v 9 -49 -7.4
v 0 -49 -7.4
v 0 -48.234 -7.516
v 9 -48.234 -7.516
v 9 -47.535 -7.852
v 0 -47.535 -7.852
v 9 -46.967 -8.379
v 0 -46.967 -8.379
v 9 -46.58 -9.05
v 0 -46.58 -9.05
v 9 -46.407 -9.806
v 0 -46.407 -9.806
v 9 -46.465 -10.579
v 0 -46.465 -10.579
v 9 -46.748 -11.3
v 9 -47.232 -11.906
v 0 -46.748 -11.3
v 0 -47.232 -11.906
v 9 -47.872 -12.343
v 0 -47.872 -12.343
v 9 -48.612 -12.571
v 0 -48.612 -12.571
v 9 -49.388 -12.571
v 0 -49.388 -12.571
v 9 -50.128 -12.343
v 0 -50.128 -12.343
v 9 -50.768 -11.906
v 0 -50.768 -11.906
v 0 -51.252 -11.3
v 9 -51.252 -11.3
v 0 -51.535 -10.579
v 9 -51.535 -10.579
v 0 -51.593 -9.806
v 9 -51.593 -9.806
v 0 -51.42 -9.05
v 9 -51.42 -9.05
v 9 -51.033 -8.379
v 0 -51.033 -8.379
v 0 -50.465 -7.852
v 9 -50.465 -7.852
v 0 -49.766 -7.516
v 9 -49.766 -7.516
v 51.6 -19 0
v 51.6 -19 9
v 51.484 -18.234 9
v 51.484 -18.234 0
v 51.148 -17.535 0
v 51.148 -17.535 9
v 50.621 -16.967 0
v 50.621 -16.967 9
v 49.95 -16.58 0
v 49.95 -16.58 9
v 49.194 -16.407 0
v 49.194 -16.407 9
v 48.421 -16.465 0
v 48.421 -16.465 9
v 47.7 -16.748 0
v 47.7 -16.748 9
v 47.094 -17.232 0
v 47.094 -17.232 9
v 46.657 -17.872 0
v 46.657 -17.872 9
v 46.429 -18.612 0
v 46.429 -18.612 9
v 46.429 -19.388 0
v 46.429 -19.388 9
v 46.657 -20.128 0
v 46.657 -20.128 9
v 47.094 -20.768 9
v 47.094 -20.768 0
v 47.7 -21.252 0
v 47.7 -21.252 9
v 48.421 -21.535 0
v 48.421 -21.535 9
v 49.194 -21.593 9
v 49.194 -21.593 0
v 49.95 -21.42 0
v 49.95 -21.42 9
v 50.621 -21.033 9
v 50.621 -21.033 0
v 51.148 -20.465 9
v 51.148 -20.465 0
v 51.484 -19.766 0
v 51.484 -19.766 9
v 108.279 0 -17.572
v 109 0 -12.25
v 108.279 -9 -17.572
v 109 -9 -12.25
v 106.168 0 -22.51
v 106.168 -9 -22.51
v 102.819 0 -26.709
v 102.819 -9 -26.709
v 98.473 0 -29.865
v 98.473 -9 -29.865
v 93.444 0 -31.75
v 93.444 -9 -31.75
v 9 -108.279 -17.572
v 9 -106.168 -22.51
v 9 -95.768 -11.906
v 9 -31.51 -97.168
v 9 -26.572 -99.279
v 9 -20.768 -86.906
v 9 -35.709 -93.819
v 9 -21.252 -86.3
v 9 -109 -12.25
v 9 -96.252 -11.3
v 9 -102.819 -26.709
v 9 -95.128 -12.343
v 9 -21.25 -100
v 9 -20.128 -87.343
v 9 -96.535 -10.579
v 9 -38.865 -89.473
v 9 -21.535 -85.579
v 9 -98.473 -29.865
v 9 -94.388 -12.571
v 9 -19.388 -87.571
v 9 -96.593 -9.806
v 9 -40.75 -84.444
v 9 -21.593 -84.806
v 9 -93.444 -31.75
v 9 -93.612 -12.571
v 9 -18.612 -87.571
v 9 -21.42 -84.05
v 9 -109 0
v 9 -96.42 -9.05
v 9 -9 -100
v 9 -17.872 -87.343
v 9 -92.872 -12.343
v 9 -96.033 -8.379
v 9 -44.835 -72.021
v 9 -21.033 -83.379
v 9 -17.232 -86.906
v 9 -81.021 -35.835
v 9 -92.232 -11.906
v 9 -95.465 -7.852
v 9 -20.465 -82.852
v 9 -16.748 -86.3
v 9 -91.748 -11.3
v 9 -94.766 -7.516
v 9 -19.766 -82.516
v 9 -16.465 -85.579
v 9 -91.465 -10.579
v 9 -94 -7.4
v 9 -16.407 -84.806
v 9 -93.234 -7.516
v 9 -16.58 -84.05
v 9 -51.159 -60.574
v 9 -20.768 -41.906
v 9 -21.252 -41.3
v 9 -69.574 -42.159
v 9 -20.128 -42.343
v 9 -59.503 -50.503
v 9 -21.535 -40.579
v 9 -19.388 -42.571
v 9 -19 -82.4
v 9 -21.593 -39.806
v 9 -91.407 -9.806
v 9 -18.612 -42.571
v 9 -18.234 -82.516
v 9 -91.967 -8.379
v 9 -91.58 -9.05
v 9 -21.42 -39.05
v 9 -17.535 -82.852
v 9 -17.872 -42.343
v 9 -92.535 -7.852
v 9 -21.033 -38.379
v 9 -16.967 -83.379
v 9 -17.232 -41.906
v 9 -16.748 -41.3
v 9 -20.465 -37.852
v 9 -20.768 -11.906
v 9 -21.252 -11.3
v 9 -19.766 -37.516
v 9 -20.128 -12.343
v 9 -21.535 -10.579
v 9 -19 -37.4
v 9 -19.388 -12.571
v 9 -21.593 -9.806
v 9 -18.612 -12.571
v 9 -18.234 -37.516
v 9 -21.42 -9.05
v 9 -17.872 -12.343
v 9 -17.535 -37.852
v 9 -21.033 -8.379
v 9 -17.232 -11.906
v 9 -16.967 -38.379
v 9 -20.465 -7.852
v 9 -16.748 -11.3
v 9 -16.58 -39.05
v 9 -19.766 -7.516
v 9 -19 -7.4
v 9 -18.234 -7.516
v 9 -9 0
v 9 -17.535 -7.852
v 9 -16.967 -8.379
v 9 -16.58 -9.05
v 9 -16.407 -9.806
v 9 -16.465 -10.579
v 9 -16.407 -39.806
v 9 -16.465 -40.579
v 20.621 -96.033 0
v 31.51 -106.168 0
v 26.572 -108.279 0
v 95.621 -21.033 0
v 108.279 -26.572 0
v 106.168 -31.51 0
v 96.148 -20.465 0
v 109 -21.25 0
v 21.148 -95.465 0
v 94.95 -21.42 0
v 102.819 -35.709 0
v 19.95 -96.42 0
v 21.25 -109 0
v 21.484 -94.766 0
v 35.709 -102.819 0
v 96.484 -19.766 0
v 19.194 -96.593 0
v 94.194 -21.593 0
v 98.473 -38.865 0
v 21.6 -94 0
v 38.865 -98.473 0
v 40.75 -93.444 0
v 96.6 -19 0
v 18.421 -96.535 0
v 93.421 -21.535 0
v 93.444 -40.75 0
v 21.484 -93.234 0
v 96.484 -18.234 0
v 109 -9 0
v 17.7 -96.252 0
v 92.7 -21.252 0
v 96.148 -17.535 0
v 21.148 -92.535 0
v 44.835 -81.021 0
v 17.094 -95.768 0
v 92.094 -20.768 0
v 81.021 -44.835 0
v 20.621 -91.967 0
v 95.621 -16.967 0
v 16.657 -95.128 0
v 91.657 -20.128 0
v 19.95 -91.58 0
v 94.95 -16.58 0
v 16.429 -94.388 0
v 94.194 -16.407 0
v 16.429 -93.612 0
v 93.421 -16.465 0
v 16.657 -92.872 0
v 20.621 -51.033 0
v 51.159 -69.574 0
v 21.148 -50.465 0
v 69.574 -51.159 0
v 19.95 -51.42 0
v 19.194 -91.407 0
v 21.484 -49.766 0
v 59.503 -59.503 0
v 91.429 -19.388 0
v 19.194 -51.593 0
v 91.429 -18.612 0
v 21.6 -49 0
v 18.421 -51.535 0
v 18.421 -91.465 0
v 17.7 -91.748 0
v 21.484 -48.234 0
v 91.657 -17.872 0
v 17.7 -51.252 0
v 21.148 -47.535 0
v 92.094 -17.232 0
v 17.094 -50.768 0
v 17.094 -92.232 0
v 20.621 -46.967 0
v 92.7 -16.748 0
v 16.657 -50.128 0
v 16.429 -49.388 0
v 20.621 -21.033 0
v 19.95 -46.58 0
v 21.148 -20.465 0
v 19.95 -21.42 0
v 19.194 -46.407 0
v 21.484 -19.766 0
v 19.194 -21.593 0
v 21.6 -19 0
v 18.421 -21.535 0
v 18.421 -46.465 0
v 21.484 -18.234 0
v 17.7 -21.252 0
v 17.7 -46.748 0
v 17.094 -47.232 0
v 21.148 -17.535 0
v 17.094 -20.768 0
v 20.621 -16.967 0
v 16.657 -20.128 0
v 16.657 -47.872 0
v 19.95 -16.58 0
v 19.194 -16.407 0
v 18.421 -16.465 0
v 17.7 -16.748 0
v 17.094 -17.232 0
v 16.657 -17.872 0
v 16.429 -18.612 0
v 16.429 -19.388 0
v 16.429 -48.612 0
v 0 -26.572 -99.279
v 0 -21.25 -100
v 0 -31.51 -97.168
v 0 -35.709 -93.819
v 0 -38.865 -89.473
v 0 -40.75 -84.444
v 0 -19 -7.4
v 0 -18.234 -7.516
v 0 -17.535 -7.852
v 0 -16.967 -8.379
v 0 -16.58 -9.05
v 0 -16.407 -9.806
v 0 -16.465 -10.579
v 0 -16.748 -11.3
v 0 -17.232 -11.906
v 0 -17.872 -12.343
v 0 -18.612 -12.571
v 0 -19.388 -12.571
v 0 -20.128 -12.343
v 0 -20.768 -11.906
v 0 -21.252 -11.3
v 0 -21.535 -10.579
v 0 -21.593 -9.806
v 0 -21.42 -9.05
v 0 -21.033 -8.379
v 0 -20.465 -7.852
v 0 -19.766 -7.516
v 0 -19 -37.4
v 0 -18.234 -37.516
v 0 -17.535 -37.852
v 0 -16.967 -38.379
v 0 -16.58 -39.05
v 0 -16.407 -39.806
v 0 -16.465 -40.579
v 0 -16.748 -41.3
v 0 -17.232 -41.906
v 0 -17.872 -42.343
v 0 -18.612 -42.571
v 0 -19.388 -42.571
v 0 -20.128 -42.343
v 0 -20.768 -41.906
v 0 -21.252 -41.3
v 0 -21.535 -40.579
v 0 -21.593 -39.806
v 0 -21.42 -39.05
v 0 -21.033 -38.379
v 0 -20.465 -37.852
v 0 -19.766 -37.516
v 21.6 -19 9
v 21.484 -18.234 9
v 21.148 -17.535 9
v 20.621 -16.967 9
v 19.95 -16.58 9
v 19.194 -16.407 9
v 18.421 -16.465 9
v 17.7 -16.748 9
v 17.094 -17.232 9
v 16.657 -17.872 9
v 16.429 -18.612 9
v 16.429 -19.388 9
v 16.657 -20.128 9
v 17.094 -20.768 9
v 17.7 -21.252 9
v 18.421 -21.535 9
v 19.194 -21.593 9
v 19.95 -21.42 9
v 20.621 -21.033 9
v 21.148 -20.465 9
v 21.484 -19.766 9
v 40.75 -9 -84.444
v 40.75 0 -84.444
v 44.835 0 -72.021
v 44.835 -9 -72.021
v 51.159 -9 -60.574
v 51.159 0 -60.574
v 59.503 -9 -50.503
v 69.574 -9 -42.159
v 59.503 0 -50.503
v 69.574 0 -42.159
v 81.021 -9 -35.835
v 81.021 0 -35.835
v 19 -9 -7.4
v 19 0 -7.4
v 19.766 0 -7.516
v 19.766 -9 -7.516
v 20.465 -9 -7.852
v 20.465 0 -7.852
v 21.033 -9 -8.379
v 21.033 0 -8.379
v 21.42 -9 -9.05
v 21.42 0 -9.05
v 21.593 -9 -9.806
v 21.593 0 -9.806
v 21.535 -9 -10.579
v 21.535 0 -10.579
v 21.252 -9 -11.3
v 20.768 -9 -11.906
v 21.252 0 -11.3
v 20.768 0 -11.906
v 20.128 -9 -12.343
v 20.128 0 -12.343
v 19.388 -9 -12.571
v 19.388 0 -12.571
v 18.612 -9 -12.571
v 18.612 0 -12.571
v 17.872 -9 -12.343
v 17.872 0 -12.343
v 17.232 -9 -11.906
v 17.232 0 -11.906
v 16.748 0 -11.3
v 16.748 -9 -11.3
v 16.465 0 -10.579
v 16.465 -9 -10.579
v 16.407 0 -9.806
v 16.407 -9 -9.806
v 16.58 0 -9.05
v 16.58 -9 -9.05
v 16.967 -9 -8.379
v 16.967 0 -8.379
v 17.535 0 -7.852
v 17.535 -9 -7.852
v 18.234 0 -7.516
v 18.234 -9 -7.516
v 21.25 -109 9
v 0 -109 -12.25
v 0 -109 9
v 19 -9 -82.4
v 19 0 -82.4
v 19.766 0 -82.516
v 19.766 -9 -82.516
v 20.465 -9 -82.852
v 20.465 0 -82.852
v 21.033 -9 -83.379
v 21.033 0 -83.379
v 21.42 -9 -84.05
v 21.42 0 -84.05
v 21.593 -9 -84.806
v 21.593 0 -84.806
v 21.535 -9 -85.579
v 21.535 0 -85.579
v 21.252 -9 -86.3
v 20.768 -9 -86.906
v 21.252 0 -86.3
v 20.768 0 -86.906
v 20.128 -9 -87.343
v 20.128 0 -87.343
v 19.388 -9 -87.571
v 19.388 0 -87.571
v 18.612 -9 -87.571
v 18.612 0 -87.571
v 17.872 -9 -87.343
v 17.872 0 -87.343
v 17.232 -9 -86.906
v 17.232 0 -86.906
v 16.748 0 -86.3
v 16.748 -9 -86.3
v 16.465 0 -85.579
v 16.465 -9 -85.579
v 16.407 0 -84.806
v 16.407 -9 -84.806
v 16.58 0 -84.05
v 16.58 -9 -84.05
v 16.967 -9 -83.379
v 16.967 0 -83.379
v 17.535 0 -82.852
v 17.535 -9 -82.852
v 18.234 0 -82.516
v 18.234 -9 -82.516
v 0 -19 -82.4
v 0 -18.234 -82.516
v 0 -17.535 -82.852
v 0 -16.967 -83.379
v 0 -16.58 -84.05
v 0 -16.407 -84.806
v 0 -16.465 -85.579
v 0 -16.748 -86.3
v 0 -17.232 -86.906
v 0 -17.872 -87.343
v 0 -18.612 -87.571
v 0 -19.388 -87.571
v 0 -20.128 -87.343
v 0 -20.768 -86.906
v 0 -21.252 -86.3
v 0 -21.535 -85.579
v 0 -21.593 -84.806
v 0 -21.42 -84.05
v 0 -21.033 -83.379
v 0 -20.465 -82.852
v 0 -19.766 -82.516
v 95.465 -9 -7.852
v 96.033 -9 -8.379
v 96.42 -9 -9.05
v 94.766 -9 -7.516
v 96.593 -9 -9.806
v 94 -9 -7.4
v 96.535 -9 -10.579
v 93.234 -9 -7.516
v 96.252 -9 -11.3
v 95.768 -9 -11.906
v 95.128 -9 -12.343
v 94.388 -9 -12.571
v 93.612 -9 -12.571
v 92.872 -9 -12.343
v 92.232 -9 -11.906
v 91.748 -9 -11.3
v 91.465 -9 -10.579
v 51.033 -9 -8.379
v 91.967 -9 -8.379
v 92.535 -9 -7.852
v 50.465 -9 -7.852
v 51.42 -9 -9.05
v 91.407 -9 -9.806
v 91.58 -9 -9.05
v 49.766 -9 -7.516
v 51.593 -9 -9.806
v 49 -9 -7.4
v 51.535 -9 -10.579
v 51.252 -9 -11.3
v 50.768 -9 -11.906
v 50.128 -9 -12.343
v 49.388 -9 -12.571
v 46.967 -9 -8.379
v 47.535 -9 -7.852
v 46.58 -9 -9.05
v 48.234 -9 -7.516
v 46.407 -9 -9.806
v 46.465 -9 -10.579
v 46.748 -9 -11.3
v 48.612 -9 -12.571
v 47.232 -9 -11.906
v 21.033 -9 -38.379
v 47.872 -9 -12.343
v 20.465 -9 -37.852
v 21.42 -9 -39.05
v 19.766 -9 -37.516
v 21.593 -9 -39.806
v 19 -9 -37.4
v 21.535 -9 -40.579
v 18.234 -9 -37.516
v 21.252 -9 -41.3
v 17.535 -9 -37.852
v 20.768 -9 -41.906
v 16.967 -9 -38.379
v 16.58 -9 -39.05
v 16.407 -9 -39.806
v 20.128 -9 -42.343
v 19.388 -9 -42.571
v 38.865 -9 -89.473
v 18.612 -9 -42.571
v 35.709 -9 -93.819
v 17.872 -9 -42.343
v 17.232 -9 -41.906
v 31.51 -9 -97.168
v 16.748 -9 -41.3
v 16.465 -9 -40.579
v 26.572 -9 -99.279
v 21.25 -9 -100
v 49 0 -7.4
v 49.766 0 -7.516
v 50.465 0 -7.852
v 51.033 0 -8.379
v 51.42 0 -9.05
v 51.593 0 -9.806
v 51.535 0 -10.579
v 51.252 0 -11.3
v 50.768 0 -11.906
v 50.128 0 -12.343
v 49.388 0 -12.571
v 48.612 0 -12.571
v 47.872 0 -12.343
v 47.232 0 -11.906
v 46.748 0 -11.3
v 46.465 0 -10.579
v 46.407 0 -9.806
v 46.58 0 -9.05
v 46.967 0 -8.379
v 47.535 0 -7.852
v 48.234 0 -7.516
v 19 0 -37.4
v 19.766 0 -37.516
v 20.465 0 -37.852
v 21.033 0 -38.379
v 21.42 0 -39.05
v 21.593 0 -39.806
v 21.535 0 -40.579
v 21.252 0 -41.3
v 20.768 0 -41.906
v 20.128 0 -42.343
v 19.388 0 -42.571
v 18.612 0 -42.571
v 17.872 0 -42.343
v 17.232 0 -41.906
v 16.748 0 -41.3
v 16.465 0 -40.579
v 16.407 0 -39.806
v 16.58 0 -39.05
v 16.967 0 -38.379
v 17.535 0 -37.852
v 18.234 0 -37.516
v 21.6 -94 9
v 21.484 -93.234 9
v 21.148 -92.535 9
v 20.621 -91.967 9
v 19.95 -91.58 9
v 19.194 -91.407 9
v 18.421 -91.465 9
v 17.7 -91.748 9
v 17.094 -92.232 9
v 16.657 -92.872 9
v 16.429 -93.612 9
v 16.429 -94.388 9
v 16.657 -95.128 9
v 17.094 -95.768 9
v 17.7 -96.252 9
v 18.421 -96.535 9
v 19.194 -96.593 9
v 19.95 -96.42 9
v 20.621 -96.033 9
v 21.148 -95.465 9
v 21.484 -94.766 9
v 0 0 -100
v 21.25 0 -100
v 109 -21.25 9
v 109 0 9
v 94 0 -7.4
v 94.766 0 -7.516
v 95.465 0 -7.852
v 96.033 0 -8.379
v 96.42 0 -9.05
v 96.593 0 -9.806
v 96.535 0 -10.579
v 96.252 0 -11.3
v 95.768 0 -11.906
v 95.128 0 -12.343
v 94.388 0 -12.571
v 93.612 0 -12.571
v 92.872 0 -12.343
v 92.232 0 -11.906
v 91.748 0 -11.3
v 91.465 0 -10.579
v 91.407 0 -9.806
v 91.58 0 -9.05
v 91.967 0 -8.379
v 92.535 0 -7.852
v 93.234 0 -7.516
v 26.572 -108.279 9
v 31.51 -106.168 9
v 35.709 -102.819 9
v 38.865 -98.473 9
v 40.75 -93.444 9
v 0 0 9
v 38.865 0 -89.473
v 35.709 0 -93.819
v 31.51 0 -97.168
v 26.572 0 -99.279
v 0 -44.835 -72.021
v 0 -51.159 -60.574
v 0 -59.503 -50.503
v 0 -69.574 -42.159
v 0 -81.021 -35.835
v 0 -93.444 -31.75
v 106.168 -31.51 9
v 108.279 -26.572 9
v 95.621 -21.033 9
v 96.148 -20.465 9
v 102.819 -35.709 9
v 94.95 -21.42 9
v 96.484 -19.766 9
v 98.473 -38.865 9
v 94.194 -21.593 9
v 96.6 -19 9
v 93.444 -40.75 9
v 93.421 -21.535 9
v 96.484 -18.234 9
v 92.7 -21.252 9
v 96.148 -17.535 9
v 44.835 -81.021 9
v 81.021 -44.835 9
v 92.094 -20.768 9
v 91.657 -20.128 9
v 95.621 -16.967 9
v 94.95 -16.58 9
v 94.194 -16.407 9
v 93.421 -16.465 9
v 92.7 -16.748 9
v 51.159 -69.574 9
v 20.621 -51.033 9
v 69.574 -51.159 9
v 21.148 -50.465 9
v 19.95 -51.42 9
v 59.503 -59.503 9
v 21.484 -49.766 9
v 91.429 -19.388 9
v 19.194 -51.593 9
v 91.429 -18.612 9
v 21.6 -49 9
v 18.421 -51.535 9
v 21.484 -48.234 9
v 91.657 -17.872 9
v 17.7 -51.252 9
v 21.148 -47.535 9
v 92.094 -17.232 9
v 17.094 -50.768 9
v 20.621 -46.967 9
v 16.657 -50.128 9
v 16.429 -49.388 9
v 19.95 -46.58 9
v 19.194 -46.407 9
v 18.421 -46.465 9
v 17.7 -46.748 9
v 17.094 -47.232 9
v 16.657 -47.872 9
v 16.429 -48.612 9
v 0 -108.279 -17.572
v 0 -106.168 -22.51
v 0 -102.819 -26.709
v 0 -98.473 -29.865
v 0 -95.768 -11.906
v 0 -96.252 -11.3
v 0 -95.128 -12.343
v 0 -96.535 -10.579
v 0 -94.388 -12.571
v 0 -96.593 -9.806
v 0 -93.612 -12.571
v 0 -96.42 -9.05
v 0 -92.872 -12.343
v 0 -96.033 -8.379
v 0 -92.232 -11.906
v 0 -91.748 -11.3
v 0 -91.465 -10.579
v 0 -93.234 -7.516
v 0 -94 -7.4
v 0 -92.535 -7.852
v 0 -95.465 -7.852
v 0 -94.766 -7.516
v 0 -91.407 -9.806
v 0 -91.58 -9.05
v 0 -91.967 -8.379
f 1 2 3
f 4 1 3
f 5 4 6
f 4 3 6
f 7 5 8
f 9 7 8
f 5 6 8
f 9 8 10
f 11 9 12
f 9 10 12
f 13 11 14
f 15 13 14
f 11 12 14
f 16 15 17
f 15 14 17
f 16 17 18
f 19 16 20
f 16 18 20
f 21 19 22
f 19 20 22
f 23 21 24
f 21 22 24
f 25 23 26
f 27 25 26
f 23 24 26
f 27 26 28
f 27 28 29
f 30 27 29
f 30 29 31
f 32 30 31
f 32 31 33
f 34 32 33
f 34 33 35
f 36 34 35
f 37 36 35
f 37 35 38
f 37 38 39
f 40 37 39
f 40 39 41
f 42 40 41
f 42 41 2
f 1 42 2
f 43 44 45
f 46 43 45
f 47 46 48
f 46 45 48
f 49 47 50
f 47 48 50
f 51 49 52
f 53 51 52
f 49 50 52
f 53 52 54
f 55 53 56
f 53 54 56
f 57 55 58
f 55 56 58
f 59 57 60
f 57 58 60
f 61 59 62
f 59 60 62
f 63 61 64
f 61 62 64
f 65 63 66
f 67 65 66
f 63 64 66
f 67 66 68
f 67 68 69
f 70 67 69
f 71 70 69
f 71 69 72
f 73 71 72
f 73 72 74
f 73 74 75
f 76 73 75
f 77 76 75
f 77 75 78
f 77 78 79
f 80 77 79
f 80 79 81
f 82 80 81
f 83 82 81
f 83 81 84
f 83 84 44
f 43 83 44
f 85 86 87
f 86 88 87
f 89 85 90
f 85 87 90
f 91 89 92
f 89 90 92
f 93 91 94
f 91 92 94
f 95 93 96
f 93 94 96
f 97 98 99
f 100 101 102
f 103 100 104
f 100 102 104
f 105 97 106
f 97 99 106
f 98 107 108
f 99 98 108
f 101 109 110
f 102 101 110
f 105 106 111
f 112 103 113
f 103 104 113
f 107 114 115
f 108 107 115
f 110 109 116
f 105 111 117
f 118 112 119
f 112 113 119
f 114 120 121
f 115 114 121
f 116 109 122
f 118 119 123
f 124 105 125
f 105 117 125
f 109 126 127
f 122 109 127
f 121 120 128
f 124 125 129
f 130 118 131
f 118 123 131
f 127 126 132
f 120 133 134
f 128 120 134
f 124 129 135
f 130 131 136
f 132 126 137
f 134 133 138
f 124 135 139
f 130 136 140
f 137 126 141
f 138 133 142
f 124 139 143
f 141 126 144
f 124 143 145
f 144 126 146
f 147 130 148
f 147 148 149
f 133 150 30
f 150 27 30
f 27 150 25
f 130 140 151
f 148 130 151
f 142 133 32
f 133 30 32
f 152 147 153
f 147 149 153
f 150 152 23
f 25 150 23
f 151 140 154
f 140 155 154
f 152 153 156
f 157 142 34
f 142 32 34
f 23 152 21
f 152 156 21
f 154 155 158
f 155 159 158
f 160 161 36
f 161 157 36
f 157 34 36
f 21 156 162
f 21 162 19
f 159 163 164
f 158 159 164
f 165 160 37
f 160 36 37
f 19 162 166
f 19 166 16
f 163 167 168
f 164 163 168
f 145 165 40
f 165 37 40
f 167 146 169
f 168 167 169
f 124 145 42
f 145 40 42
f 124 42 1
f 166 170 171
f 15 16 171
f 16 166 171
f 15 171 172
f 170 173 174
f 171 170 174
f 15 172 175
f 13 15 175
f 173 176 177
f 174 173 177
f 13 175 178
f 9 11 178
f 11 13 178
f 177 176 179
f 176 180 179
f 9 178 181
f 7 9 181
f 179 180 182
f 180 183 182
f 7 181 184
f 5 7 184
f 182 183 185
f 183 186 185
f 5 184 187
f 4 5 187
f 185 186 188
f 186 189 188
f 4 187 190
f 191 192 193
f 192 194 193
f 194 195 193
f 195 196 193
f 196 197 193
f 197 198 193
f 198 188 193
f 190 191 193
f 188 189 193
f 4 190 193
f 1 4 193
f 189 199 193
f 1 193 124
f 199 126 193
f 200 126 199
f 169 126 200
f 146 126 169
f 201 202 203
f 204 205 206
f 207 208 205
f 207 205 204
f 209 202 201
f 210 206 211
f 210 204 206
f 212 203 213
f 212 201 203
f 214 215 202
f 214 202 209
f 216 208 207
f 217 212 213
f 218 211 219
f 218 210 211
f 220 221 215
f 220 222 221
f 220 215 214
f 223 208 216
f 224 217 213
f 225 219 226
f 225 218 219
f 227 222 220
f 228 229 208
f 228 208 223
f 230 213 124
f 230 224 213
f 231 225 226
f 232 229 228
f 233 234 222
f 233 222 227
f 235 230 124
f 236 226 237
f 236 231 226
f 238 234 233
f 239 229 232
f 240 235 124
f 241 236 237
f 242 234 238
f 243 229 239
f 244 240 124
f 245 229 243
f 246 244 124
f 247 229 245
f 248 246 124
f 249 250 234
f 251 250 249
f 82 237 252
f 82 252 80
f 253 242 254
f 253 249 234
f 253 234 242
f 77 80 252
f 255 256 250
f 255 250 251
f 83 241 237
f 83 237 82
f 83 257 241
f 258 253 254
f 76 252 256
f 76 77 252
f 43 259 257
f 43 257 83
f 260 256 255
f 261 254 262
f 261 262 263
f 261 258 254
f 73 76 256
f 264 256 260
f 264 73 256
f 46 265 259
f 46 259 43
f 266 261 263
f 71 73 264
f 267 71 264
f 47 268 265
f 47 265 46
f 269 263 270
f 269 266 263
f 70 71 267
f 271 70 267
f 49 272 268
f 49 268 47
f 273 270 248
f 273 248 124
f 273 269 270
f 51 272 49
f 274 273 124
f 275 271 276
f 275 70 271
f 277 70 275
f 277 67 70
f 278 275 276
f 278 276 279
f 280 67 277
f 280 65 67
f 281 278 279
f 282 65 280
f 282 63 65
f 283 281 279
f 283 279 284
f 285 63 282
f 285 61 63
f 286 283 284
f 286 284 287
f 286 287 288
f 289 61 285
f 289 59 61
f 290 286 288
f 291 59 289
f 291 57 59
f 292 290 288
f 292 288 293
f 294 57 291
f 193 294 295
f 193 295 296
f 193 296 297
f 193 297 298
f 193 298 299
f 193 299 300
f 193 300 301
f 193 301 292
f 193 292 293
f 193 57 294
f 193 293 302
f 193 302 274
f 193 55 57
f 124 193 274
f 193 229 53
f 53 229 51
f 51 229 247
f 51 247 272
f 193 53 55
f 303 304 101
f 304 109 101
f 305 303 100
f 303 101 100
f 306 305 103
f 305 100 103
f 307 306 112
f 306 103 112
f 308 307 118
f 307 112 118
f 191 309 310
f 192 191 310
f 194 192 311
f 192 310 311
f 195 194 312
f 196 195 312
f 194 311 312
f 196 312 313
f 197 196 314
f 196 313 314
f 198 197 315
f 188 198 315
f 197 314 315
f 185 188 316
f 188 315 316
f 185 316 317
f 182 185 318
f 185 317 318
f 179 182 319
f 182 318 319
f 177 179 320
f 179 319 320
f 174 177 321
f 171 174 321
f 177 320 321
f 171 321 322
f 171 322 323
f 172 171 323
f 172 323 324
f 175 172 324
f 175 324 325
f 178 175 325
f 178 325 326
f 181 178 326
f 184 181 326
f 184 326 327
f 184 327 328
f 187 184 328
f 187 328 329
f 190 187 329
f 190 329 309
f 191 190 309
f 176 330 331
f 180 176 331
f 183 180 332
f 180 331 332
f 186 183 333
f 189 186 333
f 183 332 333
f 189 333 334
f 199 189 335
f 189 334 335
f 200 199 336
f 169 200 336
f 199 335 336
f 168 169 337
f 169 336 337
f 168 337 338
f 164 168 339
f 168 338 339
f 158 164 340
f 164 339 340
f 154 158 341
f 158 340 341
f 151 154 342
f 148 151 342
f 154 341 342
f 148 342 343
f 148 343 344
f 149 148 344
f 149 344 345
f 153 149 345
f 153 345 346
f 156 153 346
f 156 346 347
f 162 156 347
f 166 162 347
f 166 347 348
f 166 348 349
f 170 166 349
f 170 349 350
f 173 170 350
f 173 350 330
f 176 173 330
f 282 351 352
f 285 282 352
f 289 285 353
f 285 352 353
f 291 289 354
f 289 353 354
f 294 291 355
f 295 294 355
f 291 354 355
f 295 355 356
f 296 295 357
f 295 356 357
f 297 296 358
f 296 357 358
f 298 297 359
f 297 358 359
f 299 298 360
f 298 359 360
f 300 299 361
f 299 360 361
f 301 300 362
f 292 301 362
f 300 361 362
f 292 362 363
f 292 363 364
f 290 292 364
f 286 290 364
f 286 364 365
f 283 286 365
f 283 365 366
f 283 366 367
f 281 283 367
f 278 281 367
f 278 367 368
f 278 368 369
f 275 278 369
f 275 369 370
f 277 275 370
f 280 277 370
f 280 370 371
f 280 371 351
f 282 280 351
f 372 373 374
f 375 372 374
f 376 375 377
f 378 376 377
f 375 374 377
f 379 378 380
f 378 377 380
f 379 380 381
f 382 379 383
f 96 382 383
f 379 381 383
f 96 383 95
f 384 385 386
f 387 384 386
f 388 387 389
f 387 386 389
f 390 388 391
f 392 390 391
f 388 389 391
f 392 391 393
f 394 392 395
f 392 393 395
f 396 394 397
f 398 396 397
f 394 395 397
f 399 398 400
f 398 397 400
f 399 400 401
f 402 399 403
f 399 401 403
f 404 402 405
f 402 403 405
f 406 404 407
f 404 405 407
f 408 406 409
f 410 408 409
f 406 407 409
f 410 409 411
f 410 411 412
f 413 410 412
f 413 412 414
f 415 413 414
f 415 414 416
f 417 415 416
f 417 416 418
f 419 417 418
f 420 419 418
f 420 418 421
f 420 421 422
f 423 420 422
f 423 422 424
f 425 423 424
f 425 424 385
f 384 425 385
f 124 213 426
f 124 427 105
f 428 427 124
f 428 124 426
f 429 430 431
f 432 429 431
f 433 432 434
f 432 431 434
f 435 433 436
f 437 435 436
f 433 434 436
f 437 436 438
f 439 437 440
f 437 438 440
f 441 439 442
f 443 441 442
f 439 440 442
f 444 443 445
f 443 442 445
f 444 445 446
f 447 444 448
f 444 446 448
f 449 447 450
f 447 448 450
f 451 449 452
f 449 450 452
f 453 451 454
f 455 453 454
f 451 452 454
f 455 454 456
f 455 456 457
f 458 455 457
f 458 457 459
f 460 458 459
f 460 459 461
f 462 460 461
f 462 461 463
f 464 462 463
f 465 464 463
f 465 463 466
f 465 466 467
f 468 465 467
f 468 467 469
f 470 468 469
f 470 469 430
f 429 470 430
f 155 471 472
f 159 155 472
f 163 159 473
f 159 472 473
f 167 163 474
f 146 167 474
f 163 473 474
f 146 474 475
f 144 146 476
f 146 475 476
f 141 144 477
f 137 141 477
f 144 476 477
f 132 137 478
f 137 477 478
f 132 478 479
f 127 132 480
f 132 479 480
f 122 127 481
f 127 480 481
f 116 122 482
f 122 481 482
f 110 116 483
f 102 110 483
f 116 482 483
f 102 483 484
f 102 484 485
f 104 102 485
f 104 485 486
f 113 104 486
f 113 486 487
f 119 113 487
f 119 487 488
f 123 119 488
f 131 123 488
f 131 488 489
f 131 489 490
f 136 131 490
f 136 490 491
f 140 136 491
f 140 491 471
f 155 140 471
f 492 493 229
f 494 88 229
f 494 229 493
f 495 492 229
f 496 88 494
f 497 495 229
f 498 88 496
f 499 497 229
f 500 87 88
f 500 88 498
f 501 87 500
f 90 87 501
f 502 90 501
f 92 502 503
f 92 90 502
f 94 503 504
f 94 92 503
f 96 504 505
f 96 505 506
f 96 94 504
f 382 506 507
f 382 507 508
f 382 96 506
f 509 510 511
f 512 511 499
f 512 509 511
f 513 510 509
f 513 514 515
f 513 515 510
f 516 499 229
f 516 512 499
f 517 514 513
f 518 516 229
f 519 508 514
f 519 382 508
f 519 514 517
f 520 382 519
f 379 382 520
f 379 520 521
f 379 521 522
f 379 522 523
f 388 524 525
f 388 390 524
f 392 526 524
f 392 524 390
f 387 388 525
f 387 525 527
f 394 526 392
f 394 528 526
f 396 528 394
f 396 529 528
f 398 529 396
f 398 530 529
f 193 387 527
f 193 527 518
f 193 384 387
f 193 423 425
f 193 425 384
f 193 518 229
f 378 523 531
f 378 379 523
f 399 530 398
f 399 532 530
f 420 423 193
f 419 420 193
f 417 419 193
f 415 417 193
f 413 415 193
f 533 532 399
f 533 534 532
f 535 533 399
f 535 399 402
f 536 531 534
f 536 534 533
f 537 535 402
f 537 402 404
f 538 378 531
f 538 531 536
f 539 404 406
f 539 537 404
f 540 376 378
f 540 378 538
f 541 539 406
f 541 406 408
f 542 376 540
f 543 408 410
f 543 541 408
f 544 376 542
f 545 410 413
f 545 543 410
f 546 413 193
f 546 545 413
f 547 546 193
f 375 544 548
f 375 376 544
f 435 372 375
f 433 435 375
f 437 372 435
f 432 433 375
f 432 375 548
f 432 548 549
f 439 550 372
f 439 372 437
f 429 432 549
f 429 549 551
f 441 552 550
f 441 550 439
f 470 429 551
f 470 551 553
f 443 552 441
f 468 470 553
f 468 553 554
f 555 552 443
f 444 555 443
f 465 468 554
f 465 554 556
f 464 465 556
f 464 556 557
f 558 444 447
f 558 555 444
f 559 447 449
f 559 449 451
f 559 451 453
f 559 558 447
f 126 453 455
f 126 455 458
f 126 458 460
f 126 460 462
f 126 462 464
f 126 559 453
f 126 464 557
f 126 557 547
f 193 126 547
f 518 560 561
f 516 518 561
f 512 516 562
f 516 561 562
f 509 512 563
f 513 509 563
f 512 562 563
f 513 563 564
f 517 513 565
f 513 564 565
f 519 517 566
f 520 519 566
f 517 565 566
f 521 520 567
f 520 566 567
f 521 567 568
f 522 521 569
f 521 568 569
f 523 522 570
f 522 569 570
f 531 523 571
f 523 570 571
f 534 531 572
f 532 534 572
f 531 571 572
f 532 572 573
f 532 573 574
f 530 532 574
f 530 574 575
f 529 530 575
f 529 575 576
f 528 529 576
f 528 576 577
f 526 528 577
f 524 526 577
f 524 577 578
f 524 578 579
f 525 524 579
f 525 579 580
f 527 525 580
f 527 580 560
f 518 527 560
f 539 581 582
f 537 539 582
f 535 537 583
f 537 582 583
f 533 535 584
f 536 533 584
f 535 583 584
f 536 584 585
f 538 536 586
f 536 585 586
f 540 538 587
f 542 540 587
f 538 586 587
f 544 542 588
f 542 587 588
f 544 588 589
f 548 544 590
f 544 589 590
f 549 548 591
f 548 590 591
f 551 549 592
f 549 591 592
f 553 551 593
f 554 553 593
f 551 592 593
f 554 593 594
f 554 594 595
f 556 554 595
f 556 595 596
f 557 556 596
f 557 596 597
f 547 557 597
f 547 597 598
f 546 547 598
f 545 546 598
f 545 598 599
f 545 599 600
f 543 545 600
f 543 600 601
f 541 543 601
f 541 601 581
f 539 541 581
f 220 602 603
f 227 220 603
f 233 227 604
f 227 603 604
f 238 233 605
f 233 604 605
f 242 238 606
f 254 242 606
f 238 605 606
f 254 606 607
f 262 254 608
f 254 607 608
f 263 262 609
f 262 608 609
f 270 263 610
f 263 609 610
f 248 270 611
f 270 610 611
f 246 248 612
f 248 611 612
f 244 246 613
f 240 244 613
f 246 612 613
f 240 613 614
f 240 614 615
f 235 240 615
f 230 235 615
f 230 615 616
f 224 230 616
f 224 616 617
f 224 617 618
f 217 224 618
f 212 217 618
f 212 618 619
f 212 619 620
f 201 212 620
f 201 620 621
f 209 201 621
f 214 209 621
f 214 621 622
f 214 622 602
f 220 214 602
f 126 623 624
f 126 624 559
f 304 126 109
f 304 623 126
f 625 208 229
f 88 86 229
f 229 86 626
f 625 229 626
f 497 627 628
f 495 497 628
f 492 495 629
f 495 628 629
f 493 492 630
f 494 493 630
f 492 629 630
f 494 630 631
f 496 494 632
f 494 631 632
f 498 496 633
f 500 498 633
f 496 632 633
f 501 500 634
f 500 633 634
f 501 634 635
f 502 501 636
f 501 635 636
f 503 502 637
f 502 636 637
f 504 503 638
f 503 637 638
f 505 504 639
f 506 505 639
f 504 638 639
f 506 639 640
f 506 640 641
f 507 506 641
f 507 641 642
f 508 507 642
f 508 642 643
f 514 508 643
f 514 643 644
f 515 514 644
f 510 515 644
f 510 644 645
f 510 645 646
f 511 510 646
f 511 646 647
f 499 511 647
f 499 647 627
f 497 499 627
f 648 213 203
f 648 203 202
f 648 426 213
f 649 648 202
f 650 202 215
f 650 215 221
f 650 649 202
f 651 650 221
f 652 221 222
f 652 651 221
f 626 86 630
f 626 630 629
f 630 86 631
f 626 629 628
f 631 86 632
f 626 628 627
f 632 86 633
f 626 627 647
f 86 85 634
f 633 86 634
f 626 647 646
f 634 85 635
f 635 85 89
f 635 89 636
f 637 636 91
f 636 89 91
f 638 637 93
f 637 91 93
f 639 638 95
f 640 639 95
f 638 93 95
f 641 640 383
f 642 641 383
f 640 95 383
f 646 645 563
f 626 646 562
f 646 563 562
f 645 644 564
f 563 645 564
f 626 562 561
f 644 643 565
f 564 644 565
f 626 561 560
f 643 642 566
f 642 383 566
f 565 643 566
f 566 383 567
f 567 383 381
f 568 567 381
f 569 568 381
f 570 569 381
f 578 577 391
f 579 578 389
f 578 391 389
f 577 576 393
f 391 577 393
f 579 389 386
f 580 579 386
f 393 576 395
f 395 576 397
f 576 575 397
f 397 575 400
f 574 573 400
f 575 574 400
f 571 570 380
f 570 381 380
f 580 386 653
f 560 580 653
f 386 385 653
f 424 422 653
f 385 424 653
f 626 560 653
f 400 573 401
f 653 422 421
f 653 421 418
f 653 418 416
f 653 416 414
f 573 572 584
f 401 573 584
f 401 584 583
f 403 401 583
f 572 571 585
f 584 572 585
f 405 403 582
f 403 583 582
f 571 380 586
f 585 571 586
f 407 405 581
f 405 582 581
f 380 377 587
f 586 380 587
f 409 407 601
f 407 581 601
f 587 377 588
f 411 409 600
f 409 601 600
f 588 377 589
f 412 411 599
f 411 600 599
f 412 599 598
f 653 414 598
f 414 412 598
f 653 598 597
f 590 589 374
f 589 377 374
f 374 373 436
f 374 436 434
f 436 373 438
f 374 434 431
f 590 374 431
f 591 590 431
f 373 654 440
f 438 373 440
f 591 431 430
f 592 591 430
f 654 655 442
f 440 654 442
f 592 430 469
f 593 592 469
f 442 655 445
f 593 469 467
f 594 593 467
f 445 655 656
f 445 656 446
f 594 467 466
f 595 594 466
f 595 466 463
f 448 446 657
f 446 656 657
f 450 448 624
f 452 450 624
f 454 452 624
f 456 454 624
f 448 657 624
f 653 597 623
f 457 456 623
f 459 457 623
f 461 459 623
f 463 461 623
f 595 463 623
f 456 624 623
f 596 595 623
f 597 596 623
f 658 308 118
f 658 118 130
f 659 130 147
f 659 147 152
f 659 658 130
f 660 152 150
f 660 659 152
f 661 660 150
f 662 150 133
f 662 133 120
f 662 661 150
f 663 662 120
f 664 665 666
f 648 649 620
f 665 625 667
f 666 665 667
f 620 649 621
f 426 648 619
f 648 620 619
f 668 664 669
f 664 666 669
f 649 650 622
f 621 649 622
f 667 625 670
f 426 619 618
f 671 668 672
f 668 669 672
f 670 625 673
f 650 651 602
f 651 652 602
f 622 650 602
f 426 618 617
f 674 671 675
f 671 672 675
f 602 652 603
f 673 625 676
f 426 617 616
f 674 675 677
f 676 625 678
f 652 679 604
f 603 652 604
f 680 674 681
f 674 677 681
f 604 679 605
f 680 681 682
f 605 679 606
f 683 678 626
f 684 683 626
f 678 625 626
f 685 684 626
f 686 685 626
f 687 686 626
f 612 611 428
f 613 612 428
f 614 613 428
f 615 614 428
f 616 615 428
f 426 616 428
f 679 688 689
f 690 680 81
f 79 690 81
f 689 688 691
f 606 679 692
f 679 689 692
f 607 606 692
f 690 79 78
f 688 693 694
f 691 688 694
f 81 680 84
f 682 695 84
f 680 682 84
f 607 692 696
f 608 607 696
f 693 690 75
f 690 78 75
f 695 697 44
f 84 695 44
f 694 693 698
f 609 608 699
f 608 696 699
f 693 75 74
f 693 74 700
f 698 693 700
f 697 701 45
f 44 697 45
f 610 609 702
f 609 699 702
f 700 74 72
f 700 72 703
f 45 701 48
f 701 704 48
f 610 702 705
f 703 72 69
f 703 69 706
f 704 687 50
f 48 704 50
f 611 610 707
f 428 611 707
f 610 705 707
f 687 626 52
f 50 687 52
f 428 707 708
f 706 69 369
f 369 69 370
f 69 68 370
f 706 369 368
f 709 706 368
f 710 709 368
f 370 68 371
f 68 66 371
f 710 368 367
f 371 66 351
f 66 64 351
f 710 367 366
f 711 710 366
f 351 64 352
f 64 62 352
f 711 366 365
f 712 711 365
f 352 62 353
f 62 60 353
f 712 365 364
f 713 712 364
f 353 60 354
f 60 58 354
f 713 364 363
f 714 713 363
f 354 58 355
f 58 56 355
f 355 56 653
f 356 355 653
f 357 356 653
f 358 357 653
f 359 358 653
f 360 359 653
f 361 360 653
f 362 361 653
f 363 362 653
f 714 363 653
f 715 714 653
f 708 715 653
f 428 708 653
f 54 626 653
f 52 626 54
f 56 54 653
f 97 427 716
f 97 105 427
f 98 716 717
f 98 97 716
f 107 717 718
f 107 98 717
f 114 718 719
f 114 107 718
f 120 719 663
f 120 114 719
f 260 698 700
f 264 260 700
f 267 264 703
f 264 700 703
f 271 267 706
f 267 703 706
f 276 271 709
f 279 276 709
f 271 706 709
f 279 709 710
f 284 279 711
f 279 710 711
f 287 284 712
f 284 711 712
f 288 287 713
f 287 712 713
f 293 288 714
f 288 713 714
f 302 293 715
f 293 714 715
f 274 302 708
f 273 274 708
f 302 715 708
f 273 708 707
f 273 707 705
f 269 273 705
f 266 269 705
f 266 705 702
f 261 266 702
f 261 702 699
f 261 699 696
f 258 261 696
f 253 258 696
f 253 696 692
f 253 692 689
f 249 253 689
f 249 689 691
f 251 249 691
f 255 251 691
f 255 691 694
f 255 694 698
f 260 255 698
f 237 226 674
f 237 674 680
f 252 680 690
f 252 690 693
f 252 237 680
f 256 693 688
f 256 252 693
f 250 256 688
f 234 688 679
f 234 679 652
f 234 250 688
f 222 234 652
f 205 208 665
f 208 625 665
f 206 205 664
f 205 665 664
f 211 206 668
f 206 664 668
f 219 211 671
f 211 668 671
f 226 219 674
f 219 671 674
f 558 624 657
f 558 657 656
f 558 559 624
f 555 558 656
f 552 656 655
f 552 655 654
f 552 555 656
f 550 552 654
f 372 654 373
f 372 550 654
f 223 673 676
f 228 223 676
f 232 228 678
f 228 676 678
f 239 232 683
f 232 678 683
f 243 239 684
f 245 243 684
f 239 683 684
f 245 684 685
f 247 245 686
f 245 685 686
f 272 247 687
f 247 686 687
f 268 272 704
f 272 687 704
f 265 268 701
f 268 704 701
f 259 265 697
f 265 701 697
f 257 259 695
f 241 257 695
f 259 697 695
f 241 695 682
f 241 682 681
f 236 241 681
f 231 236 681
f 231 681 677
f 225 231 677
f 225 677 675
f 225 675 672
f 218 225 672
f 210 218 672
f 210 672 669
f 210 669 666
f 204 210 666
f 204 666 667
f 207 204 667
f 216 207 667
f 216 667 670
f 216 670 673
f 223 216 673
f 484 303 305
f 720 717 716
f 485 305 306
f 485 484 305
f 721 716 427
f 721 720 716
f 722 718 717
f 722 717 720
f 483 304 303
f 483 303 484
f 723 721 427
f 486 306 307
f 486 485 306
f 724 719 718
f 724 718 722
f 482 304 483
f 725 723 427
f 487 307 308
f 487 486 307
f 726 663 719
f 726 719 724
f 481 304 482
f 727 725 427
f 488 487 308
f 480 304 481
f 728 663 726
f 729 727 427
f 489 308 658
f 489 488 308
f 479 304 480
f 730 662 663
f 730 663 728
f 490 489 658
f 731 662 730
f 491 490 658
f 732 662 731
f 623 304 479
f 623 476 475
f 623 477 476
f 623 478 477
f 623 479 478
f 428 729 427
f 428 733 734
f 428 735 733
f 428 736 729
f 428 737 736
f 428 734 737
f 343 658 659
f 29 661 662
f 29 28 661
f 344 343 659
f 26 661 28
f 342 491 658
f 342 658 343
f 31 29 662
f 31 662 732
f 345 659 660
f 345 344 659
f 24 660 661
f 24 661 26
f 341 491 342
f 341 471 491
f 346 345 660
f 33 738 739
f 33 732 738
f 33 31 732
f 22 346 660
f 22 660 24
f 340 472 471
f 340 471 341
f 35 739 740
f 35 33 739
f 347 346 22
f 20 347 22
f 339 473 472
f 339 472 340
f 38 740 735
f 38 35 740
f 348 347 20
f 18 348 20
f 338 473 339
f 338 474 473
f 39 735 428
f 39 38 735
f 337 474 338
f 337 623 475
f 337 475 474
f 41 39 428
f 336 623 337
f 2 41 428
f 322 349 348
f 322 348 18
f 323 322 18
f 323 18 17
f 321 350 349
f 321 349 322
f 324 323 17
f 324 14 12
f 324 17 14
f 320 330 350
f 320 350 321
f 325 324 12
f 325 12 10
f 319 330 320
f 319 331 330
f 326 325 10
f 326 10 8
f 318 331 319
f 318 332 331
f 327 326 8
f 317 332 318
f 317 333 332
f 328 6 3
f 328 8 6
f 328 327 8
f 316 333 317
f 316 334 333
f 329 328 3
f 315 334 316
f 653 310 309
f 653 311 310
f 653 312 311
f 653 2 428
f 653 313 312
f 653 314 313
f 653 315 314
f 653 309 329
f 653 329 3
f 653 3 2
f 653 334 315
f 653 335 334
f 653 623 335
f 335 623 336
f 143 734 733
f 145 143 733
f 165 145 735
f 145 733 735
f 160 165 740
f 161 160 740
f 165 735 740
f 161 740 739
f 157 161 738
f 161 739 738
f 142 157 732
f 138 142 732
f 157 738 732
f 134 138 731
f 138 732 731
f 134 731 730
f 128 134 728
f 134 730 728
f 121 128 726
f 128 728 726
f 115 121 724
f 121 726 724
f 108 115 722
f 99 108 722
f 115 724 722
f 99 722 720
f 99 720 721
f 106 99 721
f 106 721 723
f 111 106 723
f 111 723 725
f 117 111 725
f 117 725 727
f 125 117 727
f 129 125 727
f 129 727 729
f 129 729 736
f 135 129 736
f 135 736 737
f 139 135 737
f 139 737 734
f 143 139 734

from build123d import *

# Parameters (mm, degrees)
BOSS_EXTRUDE1_DEPTH = 9
BOSS_EXTRUDE2_DEPTH = 9
BOSS_EXTRUDE3_DEPTH = 9
FILLET1_R           = 20
SKETCH4_R           = 2.6
CUT_EXTRUDE1_DEPTH  = 184.744387669
SKETCH5_R           = 2.6
CUT_EXTRUDE2_DEPTH  = 184.744387669
SKETCH6_R           = 2.6
CUT_EXTRUDE3_DEPTH  = 189.793538025


with BuildPart() as part:
    # Sketch1 → Boss-Extrude1 (new body)
    with BuildSketch(Plane.XY):
        with BuildLine():
            Line((0, 0), (109, 0))
            Line((109, 0), (109, -39))
            ThreePointArc((109, -39), (59.502525317, -59.502525317), (39, -109))
            Line((39, -109), (0, -109))
            Line((0, -109), (0, 0))
        make_face()
    extrude(amount=BOSS_EXTRUDE1_DEPTH)

    # Sketch2 → Boss-Extrude2 (add)
    with BuildSketch(Plane(origin=(0, 0, 0), x_dir=(1, 0, 0), z_dir=(0, 1, 0))):
        with BuildLine():
            Line((0, 0), (0, 100))
            Line((0, 100), (39, 100))
            ThreePointArc((39, 100), (59.502525317, 50.502525317), (109, 30))
            Line((109, 30), (109, 0))
            Line((109, 0), (0, 0))
        make_face()
    extrude(amount=-BOSS_EXTRUDE2_DEPTH)

    # Sketch3 → Boss-Extrude3 (add)
    with BuildSketch(Plane.ZY):
        with BuildLine():
            Line((-30, -109), (0, -109))
            Line((0, -109), (0, -9))
            Line((0, -9), (-100, -9))
            Line((-100, -9), (-100, -39))
            ThreePointArc((-100, -39), (-50.502525317, -59.502525317), (-30, -109))
        make_face()
    extrude(amount=-BOSS_EXTRUDE3_DEPTH)

    # Fillet1
    fillet1_edges = [part.edges().sort_by_distance(p)[0] for p in [
        (4.5, -109, -30),
        (4.5, -39, -100),
        (39, -4.5, -100),
        (39, -109, 4.5),
        (109, -39, 4.5),
        (109, -4.5, -30),
    ]]
    fillet(fillet1_edges, radius=FILLET1_R)

    # Sketch4 → Cut-Extrude1 (cut, through all)
    with BuildSketch(Plane(origin=(0, 0, 0), x_dir=(1, 0, 0), z_dir=(0, 1, 0))):
        with Locations(Location((19, 85, 0), (0, 0, 270))):
            Circle(SKETCH4_R)
        with Locations(Location((19, 10, 0), (0, 0, 270))):
            Circle(SKETCH4_R)
        with Locations(Location((94, 10, 0), (0, 0, 270))):
            Circle(SKETCH4_R)
        with Locations(Location((49, 10, 0), (0, 0, 270))):
            Circle(SKETCH4_R)
        with Locations(Location((19, 40, 0), (0, 0, 270))):
            Circle(SKETCH4_R)
    extrude(amount=-CUT_EXTRUDE1_DEPTH, mode=Mode.SUBTRACT)

    # Sketch5 → Cut-Extrude2 (cut, through all)
    with BuildSketch(Plane.ZY):
        with Locations((-85, -19)):
            Circle(SKETCH5_R)
        with Locations((-40, -19)):
            Circle(SKETCH5_R)
        with Locations((-10, -19)):
            Circle(SKETCH5_R)
        with Locations((-10, -49)):
            Circle(SKETCH5_R)
        with Locations((-10, -94)):
            Circle(SKETCH5_R)
    extrude(amount=-CUT_EXTRUDE2_DEPTH, mode=Mode.SUBTRACT)

    # Sketch6 → Cut-Extrude3 (cut, through all)
    with BuildSketch(Plane.XY.offset(9)):
        with Locations((19, -19)):
            Circle(SKETCH6_R)
        with Locations((49, -19)):
            Circle(SKETCH6_R)
        with Locations((94, -19)):
            Circle(SKETCH6_R)
        with Locations((19, -49)):
            Circle(SKETCH6_R)
        with Locations((19, -94)):
            Circle(SKETCH6_R)
    extrude(amount=-CUT_EXTRUDE3_DEPTH, mode=Mode.SUBTRACT)


solid = part.part
